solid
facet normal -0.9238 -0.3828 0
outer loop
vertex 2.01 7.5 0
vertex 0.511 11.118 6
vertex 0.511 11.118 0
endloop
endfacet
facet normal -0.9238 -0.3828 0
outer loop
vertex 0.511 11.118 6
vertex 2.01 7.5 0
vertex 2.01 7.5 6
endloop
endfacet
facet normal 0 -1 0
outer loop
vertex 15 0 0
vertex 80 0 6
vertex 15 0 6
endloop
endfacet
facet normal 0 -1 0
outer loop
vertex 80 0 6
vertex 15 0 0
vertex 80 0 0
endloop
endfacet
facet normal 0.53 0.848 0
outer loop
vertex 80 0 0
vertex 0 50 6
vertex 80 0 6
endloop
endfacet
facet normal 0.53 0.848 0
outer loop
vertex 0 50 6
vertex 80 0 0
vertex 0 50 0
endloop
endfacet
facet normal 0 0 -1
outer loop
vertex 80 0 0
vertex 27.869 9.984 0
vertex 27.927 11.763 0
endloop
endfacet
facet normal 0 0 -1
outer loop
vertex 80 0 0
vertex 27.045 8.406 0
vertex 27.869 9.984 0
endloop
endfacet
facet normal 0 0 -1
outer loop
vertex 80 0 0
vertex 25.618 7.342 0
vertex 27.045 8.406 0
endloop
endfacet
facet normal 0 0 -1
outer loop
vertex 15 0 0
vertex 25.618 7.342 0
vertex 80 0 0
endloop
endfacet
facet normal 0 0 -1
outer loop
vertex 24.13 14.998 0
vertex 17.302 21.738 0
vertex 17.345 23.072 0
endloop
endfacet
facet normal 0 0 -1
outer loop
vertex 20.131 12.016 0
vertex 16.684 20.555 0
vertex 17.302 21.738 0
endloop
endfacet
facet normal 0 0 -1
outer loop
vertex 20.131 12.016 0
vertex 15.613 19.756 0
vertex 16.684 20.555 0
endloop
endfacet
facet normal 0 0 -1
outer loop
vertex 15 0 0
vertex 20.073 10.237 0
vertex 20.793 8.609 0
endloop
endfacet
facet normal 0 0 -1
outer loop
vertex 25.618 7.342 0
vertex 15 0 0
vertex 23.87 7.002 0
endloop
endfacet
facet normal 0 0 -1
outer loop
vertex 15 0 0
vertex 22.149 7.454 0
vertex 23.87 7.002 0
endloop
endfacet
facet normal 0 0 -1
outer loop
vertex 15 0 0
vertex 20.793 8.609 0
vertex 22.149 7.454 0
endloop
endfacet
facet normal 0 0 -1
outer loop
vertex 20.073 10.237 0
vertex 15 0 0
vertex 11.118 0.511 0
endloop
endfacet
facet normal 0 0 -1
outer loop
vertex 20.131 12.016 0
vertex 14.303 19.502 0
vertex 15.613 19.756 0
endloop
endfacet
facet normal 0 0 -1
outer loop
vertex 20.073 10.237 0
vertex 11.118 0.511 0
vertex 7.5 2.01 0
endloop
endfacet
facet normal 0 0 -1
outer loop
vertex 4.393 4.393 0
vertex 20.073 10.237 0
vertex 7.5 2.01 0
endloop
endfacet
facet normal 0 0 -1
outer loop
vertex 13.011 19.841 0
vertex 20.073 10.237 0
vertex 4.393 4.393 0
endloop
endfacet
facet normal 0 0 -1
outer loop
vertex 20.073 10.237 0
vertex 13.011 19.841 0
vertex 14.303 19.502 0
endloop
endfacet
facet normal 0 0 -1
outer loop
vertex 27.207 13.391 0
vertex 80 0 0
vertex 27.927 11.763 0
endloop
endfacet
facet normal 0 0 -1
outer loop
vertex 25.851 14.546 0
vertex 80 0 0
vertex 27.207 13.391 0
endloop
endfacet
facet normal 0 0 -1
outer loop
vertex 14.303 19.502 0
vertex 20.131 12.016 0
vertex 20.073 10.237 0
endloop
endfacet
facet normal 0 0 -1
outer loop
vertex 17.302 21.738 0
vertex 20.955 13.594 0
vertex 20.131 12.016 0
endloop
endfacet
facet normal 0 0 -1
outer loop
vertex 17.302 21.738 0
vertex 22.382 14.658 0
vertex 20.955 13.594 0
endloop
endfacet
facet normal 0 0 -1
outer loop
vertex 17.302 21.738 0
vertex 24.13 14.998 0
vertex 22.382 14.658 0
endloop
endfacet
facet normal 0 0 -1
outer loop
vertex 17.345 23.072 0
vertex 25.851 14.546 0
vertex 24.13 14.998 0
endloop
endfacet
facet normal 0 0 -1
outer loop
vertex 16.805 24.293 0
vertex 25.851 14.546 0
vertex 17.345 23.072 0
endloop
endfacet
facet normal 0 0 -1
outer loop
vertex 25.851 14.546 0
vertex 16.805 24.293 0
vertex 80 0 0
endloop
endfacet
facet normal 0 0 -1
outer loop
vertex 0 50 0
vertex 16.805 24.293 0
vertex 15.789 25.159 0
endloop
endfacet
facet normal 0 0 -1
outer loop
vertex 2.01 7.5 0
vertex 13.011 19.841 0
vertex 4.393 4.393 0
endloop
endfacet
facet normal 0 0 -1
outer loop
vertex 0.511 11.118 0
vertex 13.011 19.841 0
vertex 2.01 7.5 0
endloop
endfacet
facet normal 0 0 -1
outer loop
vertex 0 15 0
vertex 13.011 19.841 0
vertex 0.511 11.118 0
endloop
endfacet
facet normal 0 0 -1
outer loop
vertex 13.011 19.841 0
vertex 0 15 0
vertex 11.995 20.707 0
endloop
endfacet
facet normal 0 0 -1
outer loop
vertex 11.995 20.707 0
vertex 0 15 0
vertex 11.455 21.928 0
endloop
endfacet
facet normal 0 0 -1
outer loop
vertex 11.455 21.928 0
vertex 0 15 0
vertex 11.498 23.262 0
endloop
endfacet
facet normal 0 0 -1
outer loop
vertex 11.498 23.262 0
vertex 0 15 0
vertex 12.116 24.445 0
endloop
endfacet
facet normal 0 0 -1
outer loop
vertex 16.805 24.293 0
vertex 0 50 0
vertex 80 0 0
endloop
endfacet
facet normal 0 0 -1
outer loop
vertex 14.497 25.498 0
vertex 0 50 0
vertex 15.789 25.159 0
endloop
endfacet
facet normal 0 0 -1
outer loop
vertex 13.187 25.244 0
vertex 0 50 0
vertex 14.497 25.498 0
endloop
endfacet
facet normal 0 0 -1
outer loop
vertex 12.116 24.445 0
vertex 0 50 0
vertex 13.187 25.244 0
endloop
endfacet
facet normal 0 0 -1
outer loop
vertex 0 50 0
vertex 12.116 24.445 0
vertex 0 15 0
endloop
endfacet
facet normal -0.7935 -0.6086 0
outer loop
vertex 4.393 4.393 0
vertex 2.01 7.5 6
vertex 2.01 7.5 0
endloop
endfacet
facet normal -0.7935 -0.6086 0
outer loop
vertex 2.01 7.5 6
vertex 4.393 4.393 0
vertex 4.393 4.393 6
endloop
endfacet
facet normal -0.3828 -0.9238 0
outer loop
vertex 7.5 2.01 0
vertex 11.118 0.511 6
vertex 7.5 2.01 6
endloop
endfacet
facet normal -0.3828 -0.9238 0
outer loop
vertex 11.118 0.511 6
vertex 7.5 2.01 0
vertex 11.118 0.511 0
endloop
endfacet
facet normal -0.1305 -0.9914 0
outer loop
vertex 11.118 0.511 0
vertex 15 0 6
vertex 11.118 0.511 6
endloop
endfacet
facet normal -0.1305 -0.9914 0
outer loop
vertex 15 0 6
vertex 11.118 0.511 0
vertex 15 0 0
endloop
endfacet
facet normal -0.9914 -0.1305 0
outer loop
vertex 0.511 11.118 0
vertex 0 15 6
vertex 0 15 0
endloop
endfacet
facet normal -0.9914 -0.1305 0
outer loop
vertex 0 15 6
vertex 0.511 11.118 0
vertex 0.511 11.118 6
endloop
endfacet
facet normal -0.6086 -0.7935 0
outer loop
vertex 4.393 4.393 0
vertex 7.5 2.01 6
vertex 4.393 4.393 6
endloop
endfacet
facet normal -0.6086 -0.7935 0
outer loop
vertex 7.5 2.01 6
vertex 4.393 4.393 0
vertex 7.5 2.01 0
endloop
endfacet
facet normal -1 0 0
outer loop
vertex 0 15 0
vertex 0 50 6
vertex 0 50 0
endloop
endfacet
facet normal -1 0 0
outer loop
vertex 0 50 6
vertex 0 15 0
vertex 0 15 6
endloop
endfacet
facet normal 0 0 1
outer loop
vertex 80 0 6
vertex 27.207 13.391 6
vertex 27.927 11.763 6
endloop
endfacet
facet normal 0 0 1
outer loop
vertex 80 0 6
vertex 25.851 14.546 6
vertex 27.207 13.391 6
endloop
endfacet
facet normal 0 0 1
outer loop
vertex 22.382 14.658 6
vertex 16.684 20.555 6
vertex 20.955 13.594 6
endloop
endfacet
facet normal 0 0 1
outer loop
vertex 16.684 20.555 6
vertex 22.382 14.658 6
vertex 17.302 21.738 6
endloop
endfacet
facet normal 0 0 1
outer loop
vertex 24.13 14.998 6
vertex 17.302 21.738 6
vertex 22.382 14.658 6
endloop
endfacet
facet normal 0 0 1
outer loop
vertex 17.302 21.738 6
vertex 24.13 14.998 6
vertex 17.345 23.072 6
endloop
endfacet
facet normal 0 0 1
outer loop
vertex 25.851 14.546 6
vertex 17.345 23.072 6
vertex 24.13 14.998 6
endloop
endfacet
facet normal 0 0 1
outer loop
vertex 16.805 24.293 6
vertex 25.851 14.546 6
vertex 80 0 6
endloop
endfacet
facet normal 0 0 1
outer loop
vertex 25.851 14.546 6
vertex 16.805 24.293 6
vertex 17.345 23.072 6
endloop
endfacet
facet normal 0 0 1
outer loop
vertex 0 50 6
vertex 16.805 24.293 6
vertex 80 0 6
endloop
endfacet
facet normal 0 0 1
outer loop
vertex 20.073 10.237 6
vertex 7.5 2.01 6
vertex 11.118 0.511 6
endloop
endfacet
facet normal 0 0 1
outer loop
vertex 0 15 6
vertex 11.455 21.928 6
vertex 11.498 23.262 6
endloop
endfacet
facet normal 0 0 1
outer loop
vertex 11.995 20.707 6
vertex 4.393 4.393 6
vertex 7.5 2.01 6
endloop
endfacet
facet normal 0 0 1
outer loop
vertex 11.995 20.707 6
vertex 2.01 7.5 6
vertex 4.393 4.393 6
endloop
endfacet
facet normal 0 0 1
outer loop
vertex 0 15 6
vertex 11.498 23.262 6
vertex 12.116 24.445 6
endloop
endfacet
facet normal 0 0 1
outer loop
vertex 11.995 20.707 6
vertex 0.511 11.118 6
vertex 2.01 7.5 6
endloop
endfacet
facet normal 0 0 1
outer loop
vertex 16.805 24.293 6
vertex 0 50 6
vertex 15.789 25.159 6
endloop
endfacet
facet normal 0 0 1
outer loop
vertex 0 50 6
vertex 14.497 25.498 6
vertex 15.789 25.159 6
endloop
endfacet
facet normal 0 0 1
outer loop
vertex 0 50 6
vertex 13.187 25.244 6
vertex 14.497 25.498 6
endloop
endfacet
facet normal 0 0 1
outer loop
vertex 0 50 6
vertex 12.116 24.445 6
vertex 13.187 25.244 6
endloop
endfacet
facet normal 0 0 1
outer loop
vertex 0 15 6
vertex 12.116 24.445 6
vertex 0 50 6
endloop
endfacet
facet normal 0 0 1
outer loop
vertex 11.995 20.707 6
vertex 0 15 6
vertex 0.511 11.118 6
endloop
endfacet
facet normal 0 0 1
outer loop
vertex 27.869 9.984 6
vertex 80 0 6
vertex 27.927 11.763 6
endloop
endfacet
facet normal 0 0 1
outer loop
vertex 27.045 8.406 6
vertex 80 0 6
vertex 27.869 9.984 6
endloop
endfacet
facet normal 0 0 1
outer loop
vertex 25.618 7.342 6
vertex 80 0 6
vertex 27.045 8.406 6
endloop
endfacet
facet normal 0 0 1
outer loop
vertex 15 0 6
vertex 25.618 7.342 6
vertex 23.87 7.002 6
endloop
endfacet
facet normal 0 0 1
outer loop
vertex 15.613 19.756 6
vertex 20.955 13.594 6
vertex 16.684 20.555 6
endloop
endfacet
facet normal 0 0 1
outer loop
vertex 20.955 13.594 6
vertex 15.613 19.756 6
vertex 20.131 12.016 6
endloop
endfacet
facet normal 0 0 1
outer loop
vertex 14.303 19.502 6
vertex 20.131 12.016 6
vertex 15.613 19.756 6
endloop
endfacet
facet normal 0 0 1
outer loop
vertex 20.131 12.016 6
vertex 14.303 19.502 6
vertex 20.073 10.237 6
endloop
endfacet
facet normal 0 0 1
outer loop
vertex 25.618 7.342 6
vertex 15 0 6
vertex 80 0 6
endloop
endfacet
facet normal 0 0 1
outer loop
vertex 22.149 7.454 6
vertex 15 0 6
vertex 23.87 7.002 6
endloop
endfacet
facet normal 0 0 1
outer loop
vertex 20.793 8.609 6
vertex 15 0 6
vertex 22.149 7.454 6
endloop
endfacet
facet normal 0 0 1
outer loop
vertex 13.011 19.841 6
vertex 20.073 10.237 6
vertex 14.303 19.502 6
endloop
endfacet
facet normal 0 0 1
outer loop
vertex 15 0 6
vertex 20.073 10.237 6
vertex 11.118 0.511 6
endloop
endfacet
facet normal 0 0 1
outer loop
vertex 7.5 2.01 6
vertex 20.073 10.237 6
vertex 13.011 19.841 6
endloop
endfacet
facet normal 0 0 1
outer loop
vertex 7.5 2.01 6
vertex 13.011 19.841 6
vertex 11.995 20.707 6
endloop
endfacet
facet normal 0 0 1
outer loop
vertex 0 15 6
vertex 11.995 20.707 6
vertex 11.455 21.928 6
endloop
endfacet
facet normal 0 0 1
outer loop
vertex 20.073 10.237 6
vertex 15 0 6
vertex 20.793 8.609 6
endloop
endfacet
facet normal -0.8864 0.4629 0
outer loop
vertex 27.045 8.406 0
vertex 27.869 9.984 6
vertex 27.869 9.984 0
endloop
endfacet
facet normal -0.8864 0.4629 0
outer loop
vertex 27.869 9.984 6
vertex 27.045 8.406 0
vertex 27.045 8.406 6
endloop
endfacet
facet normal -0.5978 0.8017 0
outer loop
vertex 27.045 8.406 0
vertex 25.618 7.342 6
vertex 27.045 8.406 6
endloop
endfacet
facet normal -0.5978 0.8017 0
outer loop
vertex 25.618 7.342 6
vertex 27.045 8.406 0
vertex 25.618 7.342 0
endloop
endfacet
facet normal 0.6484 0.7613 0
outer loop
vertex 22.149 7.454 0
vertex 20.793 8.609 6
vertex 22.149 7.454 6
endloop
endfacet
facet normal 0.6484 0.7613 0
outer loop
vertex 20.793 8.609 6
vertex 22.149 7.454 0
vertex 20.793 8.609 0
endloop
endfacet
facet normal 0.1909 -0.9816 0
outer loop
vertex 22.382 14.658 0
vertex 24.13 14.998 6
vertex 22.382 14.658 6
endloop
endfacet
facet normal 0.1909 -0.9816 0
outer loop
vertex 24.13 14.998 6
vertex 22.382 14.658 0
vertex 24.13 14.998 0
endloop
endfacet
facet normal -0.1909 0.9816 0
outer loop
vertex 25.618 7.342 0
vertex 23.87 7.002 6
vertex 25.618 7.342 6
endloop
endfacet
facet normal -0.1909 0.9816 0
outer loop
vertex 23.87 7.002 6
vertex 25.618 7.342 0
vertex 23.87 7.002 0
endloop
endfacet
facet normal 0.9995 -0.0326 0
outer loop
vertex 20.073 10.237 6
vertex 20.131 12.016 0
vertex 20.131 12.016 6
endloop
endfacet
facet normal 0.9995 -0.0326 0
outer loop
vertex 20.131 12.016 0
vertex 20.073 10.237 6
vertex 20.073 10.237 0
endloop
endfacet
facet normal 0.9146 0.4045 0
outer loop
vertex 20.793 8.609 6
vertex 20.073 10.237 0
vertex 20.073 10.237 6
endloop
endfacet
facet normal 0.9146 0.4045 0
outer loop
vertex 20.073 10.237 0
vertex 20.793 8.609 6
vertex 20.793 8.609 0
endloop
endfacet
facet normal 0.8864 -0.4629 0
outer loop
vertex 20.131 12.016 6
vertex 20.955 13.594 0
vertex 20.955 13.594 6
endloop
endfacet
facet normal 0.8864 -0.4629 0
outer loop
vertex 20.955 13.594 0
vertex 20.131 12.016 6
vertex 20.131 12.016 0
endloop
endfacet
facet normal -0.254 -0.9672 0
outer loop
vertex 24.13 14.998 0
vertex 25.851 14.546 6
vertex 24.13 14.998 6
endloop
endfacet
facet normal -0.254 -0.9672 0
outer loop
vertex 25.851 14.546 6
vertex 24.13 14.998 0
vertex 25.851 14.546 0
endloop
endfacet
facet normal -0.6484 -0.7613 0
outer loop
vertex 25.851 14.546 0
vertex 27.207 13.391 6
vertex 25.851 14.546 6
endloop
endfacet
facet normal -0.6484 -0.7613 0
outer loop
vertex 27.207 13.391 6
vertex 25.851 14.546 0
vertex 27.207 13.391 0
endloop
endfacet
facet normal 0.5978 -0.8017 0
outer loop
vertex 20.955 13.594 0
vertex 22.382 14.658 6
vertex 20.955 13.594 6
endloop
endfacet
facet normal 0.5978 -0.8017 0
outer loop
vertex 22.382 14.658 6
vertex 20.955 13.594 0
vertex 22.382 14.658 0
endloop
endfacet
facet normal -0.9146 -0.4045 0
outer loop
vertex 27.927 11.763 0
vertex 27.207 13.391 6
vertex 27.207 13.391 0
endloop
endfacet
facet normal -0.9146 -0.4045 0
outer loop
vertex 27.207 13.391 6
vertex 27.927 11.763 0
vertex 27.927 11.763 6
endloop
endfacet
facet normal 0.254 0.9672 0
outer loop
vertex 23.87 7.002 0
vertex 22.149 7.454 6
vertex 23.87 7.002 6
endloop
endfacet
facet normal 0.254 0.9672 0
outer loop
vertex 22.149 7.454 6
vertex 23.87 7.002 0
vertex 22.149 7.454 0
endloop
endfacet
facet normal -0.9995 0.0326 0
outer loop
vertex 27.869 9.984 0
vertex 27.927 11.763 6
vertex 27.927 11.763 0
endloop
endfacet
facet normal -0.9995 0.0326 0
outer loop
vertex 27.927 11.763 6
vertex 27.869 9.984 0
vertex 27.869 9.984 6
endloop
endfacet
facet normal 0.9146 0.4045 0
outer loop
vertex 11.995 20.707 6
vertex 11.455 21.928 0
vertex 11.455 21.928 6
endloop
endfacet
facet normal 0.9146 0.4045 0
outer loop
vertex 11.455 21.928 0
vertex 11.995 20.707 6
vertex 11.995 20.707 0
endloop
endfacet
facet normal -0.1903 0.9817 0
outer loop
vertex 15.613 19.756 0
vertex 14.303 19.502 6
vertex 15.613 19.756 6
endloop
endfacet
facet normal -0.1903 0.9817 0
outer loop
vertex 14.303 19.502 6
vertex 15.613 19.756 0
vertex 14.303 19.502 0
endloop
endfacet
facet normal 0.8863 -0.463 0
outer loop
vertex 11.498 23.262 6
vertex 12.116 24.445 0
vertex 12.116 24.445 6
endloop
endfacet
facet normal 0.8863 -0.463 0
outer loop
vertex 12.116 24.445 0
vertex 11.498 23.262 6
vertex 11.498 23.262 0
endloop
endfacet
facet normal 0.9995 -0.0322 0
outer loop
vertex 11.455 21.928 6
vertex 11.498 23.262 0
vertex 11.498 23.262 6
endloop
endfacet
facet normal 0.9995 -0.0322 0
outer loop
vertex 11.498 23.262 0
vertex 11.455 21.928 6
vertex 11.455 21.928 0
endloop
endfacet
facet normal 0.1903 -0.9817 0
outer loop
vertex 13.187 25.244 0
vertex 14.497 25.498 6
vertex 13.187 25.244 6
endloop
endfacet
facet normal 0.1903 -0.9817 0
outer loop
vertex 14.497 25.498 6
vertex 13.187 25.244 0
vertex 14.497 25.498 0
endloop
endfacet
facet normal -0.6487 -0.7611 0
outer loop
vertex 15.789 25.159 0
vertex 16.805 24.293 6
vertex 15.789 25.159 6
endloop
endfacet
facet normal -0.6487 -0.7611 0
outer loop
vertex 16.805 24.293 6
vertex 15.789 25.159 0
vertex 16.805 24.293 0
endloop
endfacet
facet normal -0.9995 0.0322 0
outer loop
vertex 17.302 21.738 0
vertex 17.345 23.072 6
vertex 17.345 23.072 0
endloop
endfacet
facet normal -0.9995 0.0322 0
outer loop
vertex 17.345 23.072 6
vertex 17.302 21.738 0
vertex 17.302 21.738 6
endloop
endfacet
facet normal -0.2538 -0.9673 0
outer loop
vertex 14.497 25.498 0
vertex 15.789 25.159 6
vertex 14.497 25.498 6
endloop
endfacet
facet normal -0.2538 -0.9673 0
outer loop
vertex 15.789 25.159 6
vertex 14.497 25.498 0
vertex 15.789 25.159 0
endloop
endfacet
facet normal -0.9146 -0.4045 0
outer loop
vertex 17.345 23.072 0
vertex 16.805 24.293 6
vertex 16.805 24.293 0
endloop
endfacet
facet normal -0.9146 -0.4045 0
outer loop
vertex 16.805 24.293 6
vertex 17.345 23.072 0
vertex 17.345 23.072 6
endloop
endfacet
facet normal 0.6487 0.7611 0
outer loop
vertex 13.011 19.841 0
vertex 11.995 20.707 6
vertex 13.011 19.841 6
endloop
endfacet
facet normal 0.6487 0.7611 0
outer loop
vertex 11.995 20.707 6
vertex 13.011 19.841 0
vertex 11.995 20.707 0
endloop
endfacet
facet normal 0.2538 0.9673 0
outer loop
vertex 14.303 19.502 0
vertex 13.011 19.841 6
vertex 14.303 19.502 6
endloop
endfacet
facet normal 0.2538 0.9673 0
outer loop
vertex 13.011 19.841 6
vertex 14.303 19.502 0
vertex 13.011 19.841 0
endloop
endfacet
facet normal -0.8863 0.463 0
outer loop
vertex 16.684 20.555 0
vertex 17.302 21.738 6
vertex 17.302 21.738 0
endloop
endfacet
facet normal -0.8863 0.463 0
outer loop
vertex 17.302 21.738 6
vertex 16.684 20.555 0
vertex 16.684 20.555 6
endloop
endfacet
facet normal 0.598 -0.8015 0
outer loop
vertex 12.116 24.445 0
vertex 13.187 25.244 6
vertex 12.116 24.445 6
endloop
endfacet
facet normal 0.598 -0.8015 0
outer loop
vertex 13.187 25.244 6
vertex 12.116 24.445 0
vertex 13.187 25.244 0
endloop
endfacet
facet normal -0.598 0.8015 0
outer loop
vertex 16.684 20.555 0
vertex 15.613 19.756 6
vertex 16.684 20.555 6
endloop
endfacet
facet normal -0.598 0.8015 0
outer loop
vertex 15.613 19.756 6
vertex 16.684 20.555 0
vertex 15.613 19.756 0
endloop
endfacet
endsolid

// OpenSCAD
$fn = 32;

// ----------------------------------------------------------------------
// Bracket plate: corner pad 80 x 50, fillet R15
// ----------------------------------------------------------------------

// --- parameters (mm) ---
hole_r = 3;               // bolt hole radius
plate_t = 6;              // plate thickness, Z (extrusion height)
leg_a = 80;               // base leg
leg_b = 50;               // height leg
fillet_r = 15;            // right-angle fillet radius
fit_tol = 0.05;           // declared fit tolerance (prompt contract)
free_tol = 0.3;           // declared free tolerance (prompt contract)

hole_d1 = 2 * hole_r + 2;
hole_d2 = 2 * hole_r;

profile = [[15, 0], [80, 0], [0, 50], [0, 15], [0.511, 11.118], [2.01, 7.5], [4.393, 4.393], [7.5, 2.01], [11.118, 0.511]];  // primary outline, 9 points, counter clockwise
void_1 = [[27.927, 11.763], [27.207, 13.391], [25.851, 14.546], [24.13, 14.998], [22.382, 14.658], [20.955, 13.594], [20.131, 12.016], [20.073, 10.237], [20.793, 8.609], [22.149, 7.454], [23.87, 7.002], [25.618, 7.342], [27.045, 8.406], [27.869, 9.984]];  // mount hole 1, 14 points
void_2 = [[17.345, 23.072], [16.805, 24.293], [15.789, 25.159], [14.497, 25.498], [13.187, 25.244], [12.116, 24.445], [11.498, 23.262], [11.455, 21.928], [11.995, 20.707], [13.011, 19.841], [14.303, 19.502], [15.613, 19.756], [16.684, 20.555], [17.302, 21.738]];  // mount hole 2, 14 points

// --- the one profile operation ---
difference() {
  linear_extrude(height = plate_t) polygon(points = profile);
  translate([0, 0, -1])
    linear_extrude(height = plate_t + 2) polygon(points = void_1);
  translate([0, 0, -1])
    linear_extrude(height = plate_t + 2) polygon(points = void_2);
}
